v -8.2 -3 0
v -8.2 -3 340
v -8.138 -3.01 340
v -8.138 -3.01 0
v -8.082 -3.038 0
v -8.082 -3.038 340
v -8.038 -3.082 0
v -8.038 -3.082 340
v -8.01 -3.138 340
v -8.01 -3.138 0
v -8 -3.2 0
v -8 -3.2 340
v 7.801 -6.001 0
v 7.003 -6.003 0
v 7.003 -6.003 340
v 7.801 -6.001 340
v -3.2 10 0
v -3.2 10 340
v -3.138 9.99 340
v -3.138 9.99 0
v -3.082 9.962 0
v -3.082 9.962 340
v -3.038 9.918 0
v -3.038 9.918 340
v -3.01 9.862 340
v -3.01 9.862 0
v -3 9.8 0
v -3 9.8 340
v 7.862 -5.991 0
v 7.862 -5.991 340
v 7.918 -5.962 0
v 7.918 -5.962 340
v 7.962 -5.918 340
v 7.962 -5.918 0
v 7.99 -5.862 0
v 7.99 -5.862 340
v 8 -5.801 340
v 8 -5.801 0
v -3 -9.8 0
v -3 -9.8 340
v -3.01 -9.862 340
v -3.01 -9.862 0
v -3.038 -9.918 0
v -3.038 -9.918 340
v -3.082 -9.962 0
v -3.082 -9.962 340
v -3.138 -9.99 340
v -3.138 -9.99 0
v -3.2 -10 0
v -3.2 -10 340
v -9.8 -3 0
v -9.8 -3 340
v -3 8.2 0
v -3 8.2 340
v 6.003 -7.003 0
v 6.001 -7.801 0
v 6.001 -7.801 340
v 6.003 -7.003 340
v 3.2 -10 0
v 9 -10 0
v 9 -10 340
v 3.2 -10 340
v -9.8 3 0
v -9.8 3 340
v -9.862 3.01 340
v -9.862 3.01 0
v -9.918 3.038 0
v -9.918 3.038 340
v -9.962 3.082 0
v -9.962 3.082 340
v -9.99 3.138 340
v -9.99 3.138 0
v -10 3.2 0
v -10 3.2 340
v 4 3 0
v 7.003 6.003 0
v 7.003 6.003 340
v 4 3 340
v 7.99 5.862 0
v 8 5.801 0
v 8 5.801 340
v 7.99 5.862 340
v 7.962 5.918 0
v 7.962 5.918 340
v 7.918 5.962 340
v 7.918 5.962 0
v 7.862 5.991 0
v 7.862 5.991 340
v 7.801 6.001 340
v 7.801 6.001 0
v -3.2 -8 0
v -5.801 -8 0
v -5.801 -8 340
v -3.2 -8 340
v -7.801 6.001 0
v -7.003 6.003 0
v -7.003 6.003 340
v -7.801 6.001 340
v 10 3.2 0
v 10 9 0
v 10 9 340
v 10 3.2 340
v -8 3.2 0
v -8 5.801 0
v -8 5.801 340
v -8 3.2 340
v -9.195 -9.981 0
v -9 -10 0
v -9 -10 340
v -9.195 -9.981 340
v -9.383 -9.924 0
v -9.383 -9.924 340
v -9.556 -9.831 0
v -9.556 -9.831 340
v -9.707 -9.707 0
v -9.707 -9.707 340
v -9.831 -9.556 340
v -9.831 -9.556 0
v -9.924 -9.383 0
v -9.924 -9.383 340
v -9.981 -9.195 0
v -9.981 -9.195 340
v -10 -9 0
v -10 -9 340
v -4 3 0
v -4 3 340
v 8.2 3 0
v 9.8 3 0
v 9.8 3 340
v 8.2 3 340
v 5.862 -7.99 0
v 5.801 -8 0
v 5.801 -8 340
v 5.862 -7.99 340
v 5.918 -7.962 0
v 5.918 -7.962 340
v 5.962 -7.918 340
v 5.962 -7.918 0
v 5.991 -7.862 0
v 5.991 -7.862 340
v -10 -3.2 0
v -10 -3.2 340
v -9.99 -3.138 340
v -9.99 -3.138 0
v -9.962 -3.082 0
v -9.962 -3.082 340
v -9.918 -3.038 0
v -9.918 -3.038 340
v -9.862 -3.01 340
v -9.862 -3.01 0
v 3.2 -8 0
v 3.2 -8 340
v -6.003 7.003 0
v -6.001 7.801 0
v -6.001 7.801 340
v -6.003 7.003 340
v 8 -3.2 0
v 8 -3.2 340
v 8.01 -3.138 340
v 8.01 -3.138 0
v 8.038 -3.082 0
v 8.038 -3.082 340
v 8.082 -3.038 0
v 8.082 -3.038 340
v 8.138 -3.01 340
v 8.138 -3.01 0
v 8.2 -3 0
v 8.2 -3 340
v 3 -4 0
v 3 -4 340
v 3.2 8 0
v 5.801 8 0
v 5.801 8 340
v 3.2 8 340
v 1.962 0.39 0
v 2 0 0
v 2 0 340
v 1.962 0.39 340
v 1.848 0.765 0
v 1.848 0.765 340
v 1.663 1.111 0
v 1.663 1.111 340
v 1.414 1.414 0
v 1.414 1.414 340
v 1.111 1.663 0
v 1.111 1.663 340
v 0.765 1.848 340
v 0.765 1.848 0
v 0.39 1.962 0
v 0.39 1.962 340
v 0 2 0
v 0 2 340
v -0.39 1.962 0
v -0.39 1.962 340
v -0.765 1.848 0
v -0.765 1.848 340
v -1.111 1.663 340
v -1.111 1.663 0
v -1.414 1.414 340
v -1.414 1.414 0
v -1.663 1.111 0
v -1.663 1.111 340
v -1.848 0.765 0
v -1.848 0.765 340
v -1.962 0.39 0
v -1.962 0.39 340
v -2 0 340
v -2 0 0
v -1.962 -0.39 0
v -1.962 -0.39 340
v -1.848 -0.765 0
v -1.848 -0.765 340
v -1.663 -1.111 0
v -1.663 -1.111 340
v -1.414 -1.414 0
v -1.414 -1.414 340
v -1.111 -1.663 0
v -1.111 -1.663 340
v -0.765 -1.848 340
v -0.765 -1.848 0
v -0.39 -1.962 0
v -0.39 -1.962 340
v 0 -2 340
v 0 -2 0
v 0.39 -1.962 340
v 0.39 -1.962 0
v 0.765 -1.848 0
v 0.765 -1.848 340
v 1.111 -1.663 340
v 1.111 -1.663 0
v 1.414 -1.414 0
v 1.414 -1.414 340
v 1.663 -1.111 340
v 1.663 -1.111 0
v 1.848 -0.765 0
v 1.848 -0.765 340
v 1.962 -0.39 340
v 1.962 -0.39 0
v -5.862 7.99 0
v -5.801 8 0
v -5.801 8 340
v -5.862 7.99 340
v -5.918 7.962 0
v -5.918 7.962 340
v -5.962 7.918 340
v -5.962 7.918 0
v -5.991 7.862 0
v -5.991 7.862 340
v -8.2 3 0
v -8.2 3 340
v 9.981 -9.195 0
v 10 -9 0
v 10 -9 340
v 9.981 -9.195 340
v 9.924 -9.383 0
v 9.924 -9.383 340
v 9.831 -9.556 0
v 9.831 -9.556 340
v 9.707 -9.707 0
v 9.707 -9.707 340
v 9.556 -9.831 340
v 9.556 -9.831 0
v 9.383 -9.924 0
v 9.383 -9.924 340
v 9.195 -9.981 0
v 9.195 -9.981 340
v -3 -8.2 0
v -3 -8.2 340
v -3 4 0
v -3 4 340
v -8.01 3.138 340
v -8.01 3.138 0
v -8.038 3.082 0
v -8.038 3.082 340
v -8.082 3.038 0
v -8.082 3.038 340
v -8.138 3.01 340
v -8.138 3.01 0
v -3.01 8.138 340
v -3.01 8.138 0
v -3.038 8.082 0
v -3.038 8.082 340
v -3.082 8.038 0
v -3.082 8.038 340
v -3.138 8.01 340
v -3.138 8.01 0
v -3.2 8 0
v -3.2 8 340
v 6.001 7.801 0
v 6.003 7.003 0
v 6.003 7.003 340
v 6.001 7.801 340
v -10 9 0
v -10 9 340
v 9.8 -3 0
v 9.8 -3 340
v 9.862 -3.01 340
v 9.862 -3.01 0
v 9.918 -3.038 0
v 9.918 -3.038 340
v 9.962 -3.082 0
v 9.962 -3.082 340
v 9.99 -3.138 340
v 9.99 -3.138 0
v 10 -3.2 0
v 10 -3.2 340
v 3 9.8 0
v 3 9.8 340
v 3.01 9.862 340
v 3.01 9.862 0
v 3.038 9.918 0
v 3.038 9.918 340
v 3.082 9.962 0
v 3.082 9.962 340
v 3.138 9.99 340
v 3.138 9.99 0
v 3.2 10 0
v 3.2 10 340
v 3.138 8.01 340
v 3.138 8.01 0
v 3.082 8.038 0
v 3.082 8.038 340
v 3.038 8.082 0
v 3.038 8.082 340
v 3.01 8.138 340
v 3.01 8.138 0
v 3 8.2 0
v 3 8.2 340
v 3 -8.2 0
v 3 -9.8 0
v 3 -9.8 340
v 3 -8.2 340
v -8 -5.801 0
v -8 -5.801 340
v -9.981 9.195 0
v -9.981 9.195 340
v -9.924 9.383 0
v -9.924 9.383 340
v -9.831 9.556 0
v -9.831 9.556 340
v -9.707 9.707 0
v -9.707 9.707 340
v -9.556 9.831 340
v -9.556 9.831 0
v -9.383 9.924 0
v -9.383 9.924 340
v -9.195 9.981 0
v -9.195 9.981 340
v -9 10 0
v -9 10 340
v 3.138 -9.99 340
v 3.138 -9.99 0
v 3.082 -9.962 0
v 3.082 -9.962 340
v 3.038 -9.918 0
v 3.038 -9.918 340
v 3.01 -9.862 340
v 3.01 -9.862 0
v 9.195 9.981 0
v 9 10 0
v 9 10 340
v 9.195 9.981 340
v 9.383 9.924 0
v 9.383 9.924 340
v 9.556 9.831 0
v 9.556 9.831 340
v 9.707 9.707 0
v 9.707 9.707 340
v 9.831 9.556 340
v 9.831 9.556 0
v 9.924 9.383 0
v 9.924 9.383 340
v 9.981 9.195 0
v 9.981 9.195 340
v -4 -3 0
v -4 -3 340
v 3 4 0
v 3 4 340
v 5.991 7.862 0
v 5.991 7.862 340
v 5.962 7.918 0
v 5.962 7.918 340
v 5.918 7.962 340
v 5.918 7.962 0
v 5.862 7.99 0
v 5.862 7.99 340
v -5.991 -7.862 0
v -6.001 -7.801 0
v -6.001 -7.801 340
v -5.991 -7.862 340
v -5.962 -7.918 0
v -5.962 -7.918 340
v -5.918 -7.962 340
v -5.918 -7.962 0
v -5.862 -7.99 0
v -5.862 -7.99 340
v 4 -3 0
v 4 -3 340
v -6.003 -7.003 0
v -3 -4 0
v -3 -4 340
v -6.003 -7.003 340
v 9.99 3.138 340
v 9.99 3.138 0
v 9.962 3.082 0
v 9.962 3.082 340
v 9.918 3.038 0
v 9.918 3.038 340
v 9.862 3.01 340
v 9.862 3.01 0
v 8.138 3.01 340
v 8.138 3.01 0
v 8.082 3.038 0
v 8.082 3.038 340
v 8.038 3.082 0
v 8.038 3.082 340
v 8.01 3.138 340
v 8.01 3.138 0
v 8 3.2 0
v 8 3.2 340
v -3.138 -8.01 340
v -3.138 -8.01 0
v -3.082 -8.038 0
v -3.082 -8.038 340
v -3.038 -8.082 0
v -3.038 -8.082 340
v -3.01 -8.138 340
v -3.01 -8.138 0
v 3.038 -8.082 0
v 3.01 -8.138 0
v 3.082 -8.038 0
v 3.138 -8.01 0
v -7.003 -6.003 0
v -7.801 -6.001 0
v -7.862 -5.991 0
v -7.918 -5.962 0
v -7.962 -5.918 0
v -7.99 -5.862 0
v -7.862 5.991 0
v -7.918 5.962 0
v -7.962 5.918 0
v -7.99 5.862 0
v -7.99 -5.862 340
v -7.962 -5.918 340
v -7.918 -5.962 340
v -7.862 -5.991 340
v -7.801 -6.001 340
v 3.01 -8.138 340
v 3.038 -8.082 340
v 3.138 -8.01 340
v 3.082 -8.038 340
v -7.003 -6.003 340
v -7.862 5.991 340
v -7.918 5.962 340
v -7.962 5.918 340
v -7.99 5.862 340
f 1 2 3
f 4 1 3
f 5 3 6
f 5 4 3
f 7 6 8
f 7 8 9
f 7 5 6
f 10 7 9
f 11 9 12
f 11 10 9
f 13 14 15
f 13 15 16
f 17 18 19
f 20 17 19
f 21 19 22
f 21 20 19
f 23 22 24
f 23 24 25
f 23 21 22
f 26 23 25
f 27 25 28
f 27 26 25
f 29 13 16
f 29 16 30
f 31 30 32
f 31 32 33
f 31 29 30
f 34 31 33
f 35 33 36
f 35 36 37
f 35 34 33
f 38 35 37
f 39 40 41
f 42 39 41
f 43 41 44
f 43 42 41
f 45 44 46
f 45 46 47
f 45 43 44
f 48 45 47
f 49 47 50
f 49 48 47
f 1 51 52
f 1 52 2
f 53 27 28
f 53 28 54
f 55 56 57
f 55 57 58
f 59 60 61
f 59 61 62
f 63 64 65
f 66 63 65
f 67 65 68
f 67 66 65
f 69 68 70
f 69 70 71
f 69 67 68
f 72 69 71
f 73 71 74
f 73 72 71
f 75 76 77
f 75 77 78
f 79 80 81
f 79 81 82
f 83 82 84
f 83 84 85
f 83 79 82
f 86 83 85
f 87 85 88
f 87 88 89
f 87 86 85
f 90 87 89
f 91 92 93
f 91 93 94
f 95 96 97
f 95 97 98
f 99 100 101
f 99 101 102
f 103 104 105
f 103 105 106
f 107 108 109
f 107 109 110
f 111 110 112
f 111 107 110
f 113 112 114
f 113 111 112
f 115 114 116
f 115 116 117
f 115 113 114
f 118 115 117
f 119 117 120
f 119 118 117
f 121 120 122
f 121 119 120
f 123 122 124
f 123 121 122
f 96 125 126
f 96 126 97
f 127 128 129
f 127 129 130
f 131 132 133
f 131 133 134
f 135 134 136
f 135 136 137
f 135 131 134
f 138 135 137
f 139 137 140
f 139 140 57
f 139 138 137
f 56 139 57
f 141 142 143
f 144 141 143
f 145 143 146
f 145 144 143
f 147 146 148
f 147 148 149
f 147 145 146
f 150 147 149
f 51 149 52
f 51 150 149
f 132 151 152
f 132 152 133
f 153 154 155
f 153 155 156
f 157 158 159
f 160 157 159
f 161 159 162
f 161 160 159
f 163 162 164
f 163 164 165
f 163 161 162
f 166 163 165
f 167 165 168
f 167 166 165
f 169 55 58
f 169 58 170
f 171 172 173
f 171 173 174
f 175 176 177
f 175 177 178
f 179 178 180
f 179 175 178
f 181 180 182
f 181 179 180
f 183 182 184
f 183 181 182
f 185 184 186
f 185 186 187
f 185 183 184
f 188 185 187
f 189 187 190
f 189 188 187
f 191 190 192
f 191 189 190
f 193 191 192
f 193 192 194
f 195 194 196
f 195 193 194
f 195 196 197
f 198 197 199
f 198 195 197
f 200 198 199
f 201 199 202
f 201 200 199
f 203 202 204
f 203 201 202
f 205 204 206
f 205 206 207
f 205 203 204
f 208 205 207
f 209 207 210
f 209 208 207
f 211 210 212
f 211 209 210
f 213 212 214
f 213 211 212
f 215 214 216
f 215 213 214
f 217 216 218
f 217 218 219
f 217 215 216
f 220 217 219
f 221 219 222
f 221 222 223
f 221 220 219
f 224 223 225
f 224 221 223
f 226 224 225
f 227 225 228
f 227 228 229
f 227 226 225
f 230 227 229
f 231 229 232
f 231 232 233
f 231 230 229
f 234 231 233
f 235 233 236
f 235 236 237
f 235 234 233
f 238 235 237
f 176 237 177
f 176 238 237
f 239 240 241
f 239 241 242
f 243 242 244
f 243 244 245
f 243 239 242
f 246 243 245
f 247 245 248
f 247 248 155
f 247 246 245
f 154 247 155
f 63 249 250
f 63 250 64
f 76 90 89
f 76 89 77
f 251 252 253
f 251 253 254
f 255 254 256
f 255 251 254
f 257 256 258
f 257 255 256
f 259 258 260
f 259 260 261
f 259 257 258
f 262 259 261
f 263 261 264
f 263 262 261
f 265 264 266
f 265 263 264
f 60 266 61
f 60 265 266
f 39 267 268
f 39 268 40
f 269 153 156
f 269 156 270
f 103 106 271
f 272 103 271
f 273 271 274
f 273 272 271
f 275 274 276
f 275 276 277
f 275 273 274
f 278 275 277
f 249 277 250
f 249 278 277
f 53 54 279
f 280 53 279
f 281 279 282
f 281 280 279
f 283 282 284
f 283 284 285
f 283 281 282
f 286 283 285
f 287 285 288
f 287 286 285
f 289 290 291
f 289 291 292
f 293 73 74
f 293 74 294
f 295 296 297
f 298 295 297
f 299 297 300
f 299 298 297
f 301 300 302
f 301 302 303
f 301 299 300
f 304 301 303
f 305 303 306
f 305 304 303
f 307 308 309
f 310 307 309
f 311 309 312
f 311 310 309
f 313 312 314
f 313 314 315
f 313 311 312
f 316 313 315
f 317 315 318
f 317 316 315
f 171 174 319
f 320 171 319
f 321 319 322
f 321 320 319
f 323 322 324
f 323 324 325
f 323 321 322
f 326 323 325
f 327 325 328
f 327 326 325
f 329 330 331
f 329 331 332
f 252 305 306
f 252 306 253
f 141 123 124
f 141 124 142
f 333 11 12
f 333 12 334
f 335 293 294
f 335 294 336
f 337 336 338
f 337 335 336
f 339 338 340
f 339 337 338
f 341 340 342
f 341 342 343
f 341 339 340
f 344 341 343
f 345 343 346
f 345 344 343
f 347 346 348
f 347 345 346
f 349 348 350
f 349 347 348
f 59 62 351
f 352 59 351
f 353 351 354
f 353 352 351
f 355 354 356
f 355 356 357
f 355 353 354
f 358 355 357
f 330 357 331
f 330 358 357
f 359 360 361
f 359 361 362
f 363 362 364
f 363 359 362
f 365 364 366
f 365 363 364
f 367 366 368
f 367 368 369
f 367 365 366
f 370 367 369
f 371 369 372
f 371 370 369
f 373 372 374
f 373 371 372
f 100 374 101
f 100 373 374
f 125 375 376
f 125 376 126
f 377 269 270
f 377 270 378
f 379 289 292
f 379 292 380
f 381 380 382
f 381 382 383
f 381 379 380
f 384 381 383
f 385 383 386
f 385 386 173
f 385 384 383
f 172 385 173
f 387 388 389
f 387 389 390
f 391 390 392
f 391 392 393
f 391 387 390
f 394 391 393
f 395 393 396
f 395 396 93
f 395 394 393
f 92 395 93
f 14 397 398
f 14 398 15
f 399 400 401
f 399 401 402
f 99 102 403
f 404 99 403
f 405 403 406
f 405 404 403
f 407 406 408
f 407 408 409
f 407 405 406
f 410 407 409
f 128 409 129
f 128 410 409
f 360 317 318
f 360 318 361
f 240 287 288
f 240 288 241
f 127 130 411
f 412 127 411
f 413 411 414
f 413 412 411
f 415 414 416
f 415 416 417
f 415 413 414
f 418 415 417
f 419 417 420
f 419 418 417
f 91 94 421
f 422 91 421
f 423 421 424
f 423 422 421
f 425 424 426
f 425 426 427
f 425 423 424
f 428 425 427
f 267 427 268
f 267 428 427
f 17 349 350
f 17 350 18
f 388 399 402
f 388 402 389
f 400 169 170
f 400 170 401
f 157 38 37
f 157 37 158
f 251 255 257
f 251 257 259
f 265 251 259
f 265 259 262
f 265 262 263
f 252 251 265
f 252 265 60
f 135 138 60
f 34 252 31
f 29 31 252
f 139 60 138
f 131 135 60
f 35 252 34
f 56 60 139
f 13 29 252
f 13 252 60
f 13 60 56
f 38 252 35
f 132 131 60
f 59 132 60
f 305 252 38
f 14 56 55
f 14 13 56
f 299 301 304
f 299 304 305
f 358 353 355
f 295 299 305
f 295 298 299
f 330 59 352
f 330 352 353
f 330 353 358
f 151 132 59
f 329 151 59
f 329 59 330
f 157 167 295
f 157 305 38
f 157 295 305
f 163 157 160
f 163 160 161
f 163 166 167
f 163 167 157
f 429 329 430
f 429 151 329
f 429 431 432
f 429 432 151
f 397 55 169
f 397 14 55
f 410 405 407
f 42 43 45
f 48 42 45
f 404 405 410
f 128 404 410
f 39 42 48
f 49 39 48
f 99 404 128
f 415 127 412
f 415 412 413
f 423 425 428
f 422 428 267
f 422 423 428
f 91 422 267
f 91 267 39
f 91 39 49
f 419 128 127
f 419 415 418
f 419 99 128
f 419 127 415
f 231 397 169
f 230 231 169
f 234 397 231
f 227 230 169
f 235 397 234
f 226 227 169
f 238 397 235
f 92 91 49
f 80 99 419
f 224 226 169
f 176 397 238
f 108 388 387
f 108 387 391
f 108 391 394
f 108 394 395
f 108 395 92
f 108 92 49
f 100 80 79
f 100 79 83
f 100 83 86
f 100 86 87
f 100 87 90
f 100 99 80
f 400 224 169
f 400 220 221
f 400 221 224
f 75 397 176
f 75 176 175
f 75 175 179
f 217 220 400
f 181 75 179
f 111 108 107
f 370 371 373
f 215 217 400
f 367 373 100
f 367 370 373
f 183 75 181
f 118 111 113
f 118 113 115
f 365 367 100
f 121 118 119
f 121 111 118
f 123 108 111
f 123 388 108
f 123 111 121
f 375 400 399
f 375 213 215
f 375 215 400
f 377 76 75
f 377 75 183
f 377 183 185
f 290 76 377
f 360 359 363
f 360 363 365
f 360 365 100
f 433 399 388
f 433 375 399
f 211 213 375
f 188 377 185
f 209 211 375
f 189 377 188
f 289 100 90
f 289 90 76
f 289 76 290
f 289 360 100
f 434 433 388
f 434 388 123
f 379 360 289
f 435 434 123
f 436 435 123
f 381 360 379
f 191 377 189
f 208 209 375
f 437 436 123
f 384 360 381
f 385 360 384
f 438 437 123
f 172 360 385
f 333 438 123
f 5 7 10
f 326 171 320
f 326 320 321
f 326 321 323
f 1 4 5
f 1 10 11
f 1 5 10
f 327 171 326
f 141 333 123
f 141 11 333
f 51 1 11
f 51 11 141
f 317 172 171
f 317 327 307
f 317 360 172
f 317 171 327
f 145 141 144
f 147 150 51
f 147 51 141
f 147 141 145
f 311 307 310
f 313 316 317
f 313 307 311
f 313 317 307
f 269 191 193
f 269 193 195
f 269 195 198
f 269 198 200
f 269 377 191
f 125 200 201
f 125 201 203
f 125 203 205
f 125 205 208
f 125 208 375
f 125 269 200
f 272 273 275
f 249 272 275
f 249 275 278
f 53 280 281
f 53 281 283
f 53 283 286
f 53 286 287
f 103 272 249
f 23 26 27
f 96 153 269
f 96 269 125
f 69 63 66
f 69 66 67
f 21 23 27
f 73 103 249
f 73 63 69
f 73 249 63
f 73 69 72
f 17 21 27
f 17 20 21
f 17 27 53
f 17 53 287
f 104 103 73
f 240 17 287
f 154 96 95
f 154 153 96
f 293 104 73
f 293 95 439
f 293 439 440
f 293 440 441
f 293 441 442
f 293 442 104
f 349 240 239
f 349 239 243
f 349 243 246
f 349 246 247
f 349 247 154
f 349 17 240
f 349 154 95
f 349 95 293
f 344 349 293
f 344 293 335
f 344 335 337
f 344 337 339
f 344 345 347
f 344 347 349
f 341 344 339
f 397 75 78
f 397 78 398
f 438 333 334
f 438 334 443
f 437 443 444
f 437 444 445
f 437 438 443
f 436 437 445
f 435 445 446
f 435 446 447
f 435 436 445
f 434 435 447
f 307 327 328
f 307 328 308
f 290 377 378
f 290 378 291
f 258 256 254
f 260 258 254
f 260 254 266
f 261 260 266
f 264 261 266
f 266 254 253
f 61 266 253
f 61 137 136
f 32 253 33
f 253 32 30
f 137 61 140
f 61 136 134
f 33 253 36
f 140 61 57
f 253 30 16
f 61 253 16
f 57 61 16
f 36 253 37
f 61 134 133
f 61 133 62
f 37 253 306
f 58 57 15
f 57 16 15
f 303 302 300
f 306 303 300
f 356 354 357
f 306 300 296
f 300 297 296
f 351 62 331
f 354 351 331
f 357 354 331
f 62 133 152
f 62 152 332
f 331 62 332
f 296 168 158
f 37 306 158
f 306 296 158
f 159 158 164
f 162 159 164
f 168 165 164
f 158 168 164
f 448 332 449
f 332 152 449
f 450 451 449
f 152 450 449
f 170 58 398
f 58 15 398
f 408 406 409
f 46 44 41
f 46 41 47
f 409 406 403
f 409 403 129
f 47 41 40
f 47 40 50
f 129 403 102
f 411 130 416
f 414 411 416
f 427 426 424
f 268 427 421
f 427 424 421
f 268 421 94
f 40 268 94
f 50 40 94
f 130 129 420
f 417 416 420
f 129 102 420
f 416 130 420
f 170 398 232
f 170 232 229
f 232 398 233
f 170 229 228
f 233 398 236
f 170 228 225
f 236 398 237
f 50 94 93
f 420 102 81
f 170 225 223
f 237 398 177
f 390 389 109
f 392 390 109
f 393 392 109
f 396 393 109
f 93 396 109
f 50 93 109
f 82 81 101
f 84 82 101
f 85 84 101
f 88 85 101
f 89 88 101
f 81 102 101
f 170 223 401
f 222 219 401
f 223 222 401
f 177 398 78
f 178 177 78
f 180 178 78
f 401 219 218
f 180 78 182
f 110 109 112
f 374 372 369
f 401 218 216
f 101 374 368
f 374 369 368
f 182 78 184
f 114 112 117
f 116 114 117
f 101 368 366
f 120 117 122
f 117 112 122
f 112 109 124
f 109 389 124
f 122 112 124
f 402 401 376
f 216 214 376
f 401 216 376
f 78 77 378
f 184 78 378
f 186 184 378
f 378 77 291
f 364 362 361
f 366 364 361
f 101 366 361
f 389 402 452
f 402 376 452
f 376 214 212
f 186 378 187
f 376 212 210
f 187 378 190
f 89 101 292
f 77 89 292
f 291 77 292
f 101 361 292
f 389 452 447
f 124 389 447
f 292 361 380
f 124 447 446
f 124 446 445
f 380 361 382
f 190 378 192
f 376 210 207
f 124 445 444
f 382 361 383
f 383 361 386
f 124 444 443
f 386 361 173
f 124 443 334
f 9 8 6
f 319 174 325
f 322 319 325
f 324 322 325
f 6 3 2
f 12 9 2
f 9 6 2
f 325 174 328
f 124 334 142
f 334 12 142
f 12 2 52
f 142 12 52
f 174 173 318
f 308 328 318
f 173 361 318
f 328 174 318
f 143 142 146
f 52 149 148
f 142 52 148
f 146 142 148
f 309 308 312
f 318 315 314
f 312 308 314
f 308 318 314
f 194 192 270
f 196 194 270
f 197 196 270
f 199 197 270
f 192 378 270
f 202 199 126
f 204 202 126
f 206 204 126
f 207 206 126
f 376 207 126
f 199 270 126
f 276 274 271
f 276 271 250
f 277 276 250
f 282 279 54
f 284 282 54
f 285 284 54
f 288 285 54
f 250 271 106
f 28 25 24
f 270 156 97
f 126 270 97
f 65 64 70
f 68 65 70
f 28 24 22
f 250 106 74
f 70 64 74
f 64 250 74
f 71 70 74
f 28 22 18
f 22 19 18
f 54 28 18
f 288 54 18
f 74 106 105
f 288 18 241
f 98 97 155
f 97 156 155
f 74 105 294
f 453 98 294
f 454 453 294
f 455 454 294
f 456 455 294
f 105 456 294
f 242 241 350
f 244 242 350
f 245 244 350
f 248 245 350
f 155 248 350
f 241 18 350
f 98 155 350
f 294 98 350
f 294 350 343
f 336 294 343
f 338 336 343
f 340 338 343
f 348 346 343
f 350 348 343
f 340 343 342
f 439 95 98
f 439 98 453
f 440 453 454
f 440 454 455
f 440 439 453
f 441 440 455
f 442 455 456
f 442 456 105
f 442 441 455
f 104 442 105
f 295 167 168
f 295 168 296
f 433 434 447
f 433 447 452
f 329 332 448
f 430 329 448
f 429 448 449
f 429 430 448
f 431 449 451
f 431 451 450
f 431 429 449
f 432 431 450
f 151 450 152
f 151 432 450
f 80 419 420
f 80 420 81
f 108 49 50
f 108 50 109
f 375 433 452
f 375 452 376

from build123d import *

# Parameters (mm, degrees)
SKETCH1_R           = 2
BOSS_EXTRUDE1_DEPTH = 340


with BuildPart() as part:
    # Sketch1 → Boss-Extrude1 (new body)
    with BuildSketch(Plane.XY):
        with BuildLine():
            Line((-3.2, 8), (-5.800532354, 8))
            ThreePointArc((-5.800532354, 8), (-5.941765118, 7.941609697), (-6.000531643, 7.800533062))
            Line((-6.000531643, 7.800533062), (-6.002658236, 7.002658236))
            Line((-6.002658236, 7.002658236), (-3, 4))
            Line((-3, 4), (3, 4))
            Line((3, 4), (6.002658236, 7.002658236))
            Line((6.002658236, 7.002658236), (6.000531643, 7.800533062))
            ThreePointArc((6.000531643, 7.800533062), (5.941765118, 7.941609697), (5.800532354, 8))
            Line((5.800532354, 8), (3.2, 8))
            ThreePointArc((3.2, 8), (3.058578644, 8.058578644), (3, 8.2))
            Line((3, 8.2), (3, 9.8))
            ThreePointArc((3, 9.8), (3.058578644, 9.941421356), (3.2, 10))
            Line((3.2, 10), (9, 10))
            ThreePointArc((9, 10), (9.707106781, 9.707106781), (10, 9))
            Line((10, 9), (10, 3.2))
            ThreePointArc((10, 3.2), (9.941421356, 3.058578644), (9.8, 3))
            Line((9.8, 3), (8.2, 3))
            ThreePointArc((8.2, 3), (8.058578644, 3.058578644), (8, 3.2))
            Line((8, 3.2), (8, 5.800532354))
            ThreePointArc((8, 5.800532354), (7.941609697, 5.941765118), (7.800533062, 6.000531643))
            Line((7.800533062, 6.000531643), (7.002658236, 6.002658236))
            Line((7.002658236, 6.002658236), (4, 3))
            Line((4, 3), (4, -3))
            Line((4, -3), (7.002658236, -6.002658236))
            Line((7.002658236, -6.002658236), (7.800533062, -6.000531643))
            ThreePointArc((7.800533062, -6.000531643), (7.941609697, -5.941765118), (8, -5.800532354))
            Line((8, -5.800532354), (8, -3.2))
            ThreePointArc((8, -3.2), (8.058578644, -3.058578644), (8.2, -3))
            Line((8.2, -3), (9.8, -3))
            ThreePointArc((9.8, -3), (9.941421356, -3.058578644), (10, -3.2))
            Line((10, -3.2), (10, -9))
            ThreePointArc((10, -9), (9.707106781, -9.707106781), (9, -10))
            Line((9, -10), (3.2, -10))
            ThreePointArc((3.2, -10), (3.058578644, -9.941421356), (3, -9.8))
            Line((3, -9.8), (3, -8.2))
            ThreePointArc((3, -8.2), (3.058578644, -8.058578644), (3.2, -8))
            Line((3.2, -8), (5.800532354, -8))
            ThreePointArc((5.800532354, -8), (5.941765118, -7.941609697), (6.000531643, -7.800533062))
            Line((6.000531643, -7.800533062), (6.002658236, -7.002658236))
            Line((6.002658236, -7.002658236), (3, -4))
            Line((3, -4), (-3, -4))
            Line((-3, -4), (-6.002658236, -7.002658236))
            Line((-6.002658236, -7.002658236), (-6.000531643, -7.800533062))
            ThreePointArc((-6.000531643, -7.800533062), (-5.941765118, -7.941609697), (-5.800532354, -8))
            Line((-5.800532354, -8), (-3.2, -8))
            ThreePointArc((-3.2, -8), (-3.058578644, -8.058578644), (-3, -8.2))
            Line((-3, -8.2), (-3, -9.8))
            ThreePointArc((-3, -9.8), (-3.058578644, -9.941421356), (-3.2, -10))
            Line((-3.2, -10), (-9, -10))
            ThreePointArc((-9, -10), (-9.707106781, -9.707106781), (-10, -9))
            Line((-10, -9), (-10, -3.2))
            ThreePointArc((-10, -3.2), (-9.941421356, -3.058578644), (-9.8, -3))
            Line((-9.8, -3), (-8.2, -3))
            ThreePointArc((-8.2, -3), (-8.058578644, -3.058578644), (-8, -3.2))
            Line((-8, -3.2), (-8, -5.800532354))
            ThreePointArc((-8, -5.800532354), (-7.941609697, -5.941765118), (-7.800533062, -6.000531643))
            Line((-7.800533062, -6.000531643), (-7.002658236, -6.002658236))
            Line((-7.002658236, -6.002658236), (-4, -3))
            Line((-4, -3), (-4, 3))
            Line((-4, 3), (-7.002658236, 6.002658236))
            Line((-7.002658236, 6.002658236), (-7.800533062, 6.000531643))
            ThreePointArc((-7.800533062, 6.000531643), (-7.941609697, 5.941765118), (-8, 5.800532354))
            Line((-8, 5.800532354), (-8, 3.2))
            ThreePointArc((-8, 3.2), (-8.058578644, 3.058578644), (-8.2, 3))
            Line((-8.2, 3), (-9.8, 3))
            ThreePointArc((-9.8, 3), (-9.941421356, 3.058578644), (-10, 3.2))
            Line((-10, 3.2), (-10, 9))
            ThreePointArc((-10, 9), (-9.707106781, 9.707106781), (-9, 10))
            Line((-9, 10), (-3.2, 10))
            ThreePointArc((-3.2, 10), (-3.058578644, 9.941421356), (-3, 9.8))
            Line((-3, 9.8), (-3, 8.2))
            ThreePointArc((-3, 8.2), (-3.058578644, 8.058578644), (-3.2, 8))
        make_face()
        Circle(SKETCH1_R, mode=Mode.SUBTRACT)
    extrude(amount=BOSS_EXTRUDE1_DEPTH)


solid = part.part
